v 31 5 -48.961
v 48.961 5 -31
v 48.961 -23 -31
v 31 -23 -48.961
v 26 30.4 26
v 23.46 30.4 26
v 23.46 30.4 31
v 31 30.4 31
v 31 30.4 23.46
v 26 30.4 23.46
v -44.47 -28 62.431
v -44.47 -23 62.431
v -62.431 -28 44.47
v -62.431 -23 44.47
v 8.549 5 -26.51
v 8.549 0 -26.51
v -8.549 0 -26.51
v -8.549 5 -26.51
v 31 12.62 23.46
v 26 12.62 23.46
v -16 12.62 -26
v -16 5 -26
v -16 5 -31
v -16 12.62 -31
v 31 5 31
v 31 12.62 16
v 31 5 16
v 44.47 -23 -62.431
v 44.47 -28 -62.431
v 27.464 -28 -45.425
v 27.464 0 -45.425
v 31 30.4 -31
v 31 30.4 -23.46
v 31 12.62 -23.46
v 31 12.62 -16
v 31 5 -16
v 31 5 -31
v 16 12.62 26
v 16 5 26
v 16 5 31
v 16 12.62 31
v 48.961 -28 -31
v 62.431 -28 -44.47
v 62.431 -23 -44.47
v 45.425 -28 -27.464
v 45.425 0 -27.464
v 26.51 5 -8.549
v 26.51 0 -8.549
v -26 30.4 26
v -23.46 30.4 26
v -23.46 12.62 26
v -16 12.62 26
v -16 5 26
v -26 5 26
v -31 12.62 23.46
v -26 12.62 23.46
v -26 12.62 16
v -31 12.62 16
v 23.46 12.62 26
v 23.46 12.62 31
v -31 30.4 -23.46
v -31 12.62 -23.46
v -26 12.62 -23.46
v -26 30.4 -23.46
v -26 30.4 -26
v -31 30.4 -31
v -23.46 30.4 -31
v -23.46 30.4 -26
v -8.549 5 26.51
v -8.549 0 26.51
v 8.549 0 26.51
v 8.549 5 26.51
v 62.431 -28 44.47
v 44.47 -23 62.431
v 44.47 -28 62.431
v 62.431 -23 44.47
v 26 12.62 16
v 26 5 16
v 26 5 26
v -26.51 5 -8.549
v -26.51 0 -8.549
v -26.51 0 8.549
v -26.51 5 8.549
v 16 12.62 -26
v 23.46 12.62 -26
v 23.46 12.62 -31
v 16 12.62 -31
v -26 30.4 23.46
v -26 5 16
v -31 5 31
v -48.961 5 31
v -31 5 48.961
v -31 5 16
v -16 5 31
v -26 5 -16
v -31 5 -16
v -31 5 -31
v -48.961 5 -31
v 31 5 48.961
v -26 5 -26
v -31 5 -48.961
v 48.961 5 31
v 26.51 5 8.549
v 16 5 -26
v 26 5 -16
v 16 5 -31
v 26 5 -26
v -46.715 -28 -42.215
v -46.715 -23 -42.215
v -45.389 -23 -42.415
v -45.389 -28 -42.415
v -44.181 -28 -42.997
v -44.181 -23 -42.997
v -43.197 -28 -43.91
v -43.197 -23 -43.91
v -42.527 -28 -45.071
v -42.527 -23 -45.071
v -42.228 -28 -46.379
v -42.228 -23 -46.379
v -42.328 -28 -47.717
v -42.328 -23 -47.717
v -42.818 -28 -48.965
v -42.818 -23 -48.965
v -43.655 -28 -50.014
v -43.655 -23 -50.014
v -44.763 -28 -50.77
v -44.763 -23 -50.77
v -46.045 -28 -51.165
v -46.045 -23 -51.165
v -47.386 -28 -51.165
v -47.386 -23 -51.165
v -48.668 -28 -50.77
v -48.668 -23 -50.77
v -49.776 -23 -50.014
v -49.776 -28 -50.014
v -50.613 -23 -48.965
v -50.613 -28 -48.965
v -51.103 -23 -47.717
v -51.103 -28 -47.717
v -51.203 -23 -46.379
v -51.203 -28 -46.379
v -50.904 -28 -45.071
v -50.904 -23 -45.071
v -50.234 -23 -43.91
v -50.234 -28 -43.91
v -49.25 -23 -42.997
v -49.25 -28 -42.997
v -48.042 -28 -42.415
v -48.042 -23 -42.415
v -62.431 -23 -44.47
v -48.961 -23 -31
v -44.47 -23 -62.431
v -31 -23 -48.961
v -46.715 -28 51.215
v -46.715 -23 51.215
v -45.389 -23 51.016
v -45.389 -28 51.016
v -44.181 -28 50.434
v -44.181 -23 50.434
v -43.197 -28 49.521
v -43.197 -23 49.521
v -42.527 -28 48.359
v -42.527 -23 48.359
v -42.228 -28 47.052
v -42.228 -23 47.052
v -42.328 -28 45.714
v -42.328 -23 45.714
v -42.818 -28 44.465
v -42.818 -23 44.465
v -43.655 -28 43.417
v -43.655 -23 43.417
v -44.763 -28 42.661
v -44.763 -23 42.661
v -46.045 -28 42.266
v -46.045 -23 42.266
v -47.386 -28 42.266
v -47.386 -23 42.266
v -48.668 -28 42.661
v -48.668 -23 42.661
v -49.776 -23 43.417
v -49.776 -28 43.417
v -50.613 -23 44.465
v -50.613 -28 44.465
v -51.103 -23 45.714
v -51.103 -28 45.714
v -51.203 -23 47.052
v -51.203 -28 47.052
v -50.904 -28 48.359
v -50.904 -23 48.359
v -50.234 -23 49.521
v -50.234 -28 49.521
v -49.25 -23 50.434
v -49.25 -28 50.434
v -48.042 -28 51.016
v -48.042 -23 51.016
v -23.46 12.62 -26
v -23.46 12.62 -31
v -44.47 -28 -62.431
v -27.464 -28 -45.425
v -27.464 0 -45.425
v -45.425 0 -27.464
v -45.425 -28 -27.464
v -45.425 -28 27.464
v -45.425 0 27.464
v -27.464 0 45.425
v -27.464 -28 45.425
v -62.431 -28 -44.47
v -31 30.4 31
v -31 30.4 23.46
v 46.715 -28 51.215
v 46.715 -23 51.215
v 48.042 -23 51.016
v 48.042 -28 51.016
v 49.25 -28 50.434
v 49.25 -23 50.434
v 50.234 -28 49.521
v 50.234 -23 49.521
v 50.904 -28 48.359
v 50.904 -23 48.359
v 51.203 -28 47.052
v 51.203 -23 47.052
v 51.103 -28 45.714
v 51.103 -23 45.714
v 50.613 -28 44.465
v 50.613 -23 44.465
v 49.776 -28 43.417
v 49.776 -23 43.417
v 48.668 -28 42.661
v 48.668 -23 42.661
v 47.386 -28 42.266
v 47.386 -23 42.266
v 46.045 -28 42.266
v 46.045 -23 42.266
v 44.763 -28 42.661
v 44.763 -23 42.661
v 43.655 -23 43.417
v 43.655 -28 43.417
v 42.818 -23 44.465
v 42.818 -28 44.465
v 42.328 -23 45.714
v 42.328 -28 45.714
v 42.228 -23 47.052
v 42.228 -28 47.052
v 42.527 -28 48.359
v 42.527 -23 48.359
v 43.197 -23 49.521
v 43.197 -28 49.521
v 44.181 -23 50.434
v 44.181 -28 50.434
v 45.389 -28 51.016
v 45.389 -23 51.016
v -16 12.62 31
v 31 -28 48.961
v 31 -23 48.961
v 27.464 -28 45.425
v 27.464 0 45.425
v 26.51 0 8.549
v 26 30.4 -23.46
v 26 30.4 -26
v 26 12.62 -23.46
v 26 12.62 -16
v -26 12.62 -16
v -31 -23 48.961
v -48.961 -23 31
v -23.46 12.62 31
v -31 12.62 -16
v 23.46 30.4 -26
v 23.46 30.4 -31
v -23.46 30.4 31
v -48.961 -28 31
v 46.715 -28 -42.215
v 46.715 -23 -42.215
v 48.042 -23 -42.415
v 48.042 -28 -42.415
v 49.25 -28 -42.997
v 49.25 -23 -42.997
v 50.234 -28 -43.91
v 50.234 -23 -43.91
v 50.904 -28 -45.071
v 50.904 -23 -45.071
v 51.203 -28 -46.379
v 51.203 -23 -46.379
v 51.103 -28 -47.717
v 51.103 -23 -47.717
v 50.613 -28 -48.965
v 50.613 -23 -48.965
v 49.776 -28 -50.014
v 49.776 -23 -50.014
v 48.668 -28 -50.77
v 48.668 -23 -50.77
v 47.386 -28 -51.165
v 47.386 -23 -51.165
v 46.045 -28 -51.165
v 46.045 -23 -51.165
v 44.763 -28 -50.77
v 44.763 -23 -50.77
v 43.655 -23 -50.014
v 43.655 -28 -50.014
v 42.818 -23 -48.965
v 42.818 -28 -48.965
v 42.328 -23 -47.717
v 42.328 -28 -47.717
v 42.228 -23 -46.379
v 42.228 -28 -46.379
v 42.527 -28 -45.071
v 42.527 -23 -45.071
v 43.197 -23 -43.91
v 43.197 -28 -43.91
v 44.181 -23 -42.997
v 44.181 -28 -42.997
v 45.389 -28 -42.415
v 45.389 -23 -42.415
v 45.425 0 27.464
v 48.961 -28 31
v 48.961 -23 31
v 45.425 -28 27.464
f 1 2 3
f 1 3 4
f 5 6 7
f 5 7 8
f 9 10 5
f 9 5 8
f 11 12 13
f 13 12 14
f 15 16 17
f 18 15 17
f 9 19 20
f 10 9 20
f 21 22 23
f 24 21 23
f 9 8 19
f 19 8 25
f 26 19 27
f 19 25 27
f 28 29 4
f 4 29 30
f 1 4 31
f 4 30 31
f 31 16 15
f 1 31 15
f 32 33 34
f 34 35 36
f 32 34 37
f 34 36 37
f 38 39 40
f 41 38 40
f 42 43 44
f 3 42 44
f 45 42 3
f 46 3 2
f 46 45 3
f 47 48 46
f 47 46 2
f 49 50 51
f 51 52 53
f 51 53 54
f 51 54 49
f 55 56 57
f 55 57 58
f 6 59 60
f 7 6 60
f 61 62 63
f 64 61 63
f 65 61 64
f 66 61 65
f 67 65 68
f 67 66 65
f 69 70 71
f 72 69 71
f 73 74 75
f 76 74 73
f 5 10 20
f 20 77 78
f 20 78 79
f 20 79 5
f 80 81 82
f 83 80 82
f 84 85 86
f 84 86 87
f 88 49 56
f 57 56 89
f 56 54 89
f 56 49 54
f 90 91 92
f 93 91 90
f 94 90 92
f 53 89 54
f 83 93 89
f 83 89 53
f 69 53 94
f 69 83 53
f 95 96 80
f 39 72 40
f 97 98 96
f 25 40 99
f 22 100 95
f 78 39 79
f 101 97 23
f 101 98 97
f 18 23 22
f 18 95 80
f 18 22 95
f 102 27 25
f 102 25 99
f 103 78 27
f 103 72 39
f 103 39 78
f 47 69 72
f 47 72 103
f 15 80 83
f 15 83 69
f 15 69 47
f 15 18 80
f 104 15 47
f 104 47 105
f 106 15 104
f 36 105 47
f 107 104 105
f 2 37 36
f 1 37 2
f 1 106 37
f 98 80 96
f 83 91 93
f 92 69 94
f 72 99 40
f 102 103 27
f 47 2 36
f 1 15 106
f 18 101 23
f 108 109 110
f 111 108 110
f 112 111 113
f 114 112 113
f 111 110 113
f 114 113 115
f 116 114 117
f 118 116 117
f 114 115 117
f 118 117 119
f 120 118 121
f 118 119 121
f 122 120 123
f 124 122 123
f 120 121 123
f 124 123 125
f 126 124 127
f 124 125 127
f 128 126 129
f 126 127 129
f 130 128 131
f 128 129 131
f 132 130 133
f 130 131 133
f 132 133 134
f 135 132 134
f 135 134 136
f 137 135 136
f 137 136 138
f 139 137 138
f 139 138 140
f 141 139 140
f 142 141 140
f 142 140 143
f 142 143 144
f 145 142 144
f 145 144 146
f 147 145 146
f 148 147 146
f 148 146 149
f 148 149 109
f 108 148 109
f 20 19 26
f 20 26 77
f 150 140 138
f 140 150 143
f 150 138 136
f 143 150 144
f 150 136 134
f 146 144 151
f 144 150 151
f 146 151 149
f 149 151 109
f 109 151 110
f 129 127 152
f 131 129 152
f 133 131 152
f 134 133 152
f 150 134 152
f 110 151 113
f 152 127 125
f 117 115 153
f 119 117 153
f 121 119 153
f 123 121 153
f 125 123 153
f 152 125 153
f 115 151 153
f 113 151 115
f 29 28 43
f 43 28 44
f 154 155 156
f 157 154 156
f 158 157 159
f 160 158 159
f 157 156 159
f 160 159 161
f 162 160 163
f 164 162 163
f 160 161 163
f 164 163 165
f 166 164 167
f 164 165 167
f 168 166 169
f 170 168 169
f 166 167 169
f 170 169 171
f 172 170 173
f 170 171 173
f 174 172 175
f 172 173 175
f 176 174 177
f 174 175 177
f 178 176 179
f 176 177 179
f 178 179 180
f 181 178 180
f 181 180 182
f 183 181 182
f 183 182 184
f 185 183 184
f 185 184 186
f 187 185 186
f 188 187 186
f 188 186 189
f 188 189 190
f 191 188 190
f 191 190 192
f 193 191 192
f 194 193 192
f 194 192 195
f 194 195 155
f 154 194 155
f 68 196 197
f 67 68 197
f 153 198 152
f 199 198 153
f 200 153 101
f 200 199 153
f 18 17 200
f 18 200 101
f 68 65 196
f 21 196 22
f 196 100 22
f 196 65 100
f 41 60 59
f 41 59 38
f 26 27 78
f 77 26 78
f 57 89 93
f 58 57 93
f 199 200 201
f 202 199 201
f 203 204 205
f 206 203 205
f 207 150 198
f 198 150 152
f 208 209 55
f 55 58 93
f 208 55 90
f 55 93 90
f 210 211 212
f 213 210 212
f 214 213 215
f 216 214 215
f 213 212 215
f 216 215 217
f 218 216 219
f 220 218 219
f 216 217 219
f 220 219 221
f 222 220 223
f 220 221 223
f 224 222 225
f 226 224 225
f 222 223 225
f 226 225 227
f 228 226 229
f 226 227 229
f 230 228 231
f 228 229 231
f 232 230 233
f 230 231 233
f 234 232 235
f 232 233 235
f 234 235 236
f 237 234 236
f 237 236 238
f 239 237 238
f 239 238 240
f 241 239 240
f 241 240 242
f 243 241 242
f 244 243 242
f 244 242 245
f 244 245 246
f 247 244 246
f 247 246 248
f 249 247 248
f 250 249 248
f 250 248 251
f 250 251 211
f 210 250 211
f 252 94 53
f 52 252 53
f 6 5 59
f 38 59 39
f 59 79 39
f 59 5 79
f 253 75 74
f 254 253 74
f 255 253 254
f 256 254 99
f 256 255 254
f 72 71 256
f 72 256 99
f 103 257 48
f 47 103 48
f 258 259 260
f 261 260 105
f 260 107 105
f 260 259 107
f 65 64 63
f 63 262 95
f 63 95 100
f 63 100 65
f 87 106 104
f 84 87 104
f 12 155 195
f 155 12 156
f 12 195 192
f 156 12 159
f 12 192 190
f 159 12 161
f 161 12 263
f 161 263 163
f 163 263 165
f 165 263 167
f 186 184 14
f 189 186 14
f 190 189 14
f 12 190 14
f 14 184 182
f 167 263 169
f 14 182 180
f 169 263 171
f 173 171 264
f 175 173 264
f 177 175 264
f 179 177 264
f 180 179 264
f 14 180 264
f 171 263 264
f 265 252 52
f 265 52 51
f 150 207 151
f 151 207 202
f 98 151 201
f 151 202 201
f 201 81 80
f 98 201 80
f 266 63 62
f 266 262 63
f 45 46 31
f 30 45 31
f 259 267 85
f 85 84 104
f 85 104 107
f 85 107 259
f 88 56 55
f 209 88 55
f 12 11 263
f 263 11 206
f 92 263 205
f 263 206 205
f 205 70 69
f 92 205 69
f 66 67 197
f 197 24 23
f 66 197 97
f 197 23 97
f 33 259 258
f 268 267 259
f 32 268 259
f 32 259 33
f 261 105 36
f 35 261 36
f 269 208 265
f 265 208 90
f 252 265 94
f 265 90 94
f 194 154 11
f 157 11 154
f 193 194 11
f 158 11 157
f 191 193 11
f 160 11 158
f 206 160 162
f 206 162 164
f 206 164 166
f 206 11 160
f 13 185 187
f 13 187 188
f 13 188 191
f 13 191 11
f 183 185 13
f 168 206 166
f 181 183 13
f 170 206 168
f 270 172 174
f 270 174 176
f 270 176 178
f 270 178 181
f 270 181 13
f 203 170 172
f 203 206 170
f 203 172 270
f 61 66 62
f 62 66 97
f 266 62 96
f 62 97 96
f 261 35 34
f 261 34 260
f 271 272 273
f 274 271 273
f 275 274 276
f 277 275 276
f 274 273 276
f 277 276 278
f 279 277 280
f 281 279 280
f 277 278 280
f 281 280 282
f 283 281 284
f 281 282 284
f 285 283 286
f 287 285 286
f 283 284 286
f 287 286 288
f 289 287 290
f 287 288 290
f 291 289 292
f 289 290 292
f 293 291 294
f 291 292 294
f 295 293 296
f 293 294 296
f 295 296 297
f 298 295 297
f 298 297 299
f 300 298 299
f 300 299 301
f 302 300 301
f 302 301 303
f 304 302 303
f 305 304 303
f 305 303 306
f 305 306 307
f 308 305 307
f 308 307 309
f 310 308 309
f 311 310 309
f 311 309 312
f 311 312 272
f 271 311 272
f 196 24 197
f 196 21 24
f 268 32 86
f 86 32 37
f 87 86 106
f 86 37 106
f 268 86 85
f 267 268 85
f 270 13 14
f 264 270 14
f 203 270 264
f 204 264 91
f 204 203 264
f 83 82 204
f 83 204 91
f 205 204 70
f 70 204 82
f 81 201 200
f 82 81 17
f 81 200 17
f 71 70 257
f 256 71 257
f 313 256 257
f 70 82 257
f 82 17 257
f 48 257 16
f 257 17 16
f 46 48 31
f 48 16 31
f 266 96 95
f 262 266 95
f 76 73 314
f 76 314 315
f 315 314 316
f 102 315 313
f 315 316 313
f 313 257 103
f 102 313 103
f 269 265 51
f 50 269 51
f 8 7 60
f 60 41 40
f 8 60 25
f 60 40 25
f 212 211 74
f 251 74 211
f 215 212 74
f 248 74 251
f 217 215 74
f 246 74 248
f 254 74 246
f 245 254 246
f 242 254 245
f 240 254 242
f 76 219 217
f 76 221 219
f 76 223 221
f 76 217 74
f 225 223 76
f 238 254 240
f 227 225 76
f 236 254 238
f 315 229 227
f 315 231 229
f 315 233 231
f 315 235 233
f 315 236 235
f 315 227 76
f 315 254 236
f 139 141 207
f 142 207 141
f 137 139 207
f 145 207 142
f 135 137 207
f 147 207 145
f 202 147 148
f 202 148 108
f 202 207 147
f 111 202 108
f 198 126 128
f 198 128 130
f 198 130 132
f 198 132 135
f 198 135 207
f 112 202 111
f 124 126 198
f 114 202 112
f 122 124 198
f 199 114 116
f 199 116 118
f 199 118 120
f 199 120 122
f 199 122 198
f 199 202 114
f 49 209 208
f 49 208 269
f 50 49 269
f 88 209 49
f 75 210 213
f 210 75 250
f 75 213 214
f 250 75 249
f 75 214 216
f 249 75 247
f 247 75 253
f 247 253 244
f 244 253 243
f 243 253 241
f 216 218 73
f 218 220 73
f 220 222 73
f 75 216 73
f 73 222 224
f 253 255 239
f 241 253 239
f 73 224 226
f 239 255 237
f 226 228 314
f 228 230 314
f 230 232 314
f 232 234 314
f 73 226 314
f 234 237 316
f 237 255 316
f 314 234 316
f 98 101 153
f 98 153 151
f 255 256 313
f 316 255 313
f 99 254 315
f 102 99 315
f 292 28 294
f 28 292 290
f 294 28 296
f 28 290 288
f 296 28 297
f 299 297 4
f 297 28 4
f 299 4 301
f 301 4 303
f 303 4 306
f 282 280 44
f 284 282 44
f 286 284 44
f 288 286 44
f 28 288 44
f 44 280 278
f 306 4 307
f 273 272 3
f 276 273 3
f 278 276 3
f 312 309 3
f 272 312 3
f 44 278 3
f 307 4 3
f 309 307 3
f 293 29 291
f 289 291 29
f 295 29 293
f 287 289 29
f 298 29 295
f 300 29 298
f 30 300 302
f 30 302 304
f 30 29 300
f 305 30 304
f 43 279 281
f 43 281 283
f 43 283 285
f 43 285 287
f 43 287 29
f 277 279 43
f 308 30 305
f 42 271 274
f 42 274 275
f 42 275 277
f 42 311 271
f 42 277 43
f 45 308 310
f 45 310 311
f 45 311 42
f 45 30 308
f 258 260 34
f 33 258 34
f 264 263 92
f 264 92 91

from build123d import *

# Parameters (mm, degrees)
BOSS_EXTRUDE1_DEPTH = 5
BOSS_EXTRUDE2_DEPTH = 7.62
BOSS_EXTRUDE3_DEPTH = 28
SKETCH5_W           = 25.4
SKETCH5_H           = 5
BOSS_EXTRUDE4_DEPTH = 19.05
SKETCH6_W           = 25.4
SKETCH6_H           = 5
BOSS_EXTRUDE5_DEPTH = 19.05
SKETCH7_W           = 25.4
SKETCH7_H           = 5
BOSS_EXTRUDE6_DEPTH = 19.05
SKETCH8_W           = 25.4
SKETCH8_H           = 5
BOSS_EXTRUDE7_DEPTH = 19.05
SKETCH9_R           = 4.5
CUT_EXTRUDE1_DEPTH  = 12.7
BOSS_EXTRUDE8_DEPTH = 25.4


with BuildPart() as part:
    # Sketch2 → Boss-Extrude1 (new body)
    with BuildSketch(Plane(origin=(0, 0, 0), x_dir=(1, 0, 0), z_dir=(0, 1, 0))):
        Polygon((-31, 48.960512242), (-48.960512242, 31), (-26.509871939, 8.549359697), (-26.509871939, -8.549359697), (-48.960512242, -31), (-31, -48.960512242), (-8.549359697, -26.509871939), (8.549359697, -26.509871939), (31, -48.960512242), (48.960512242, -31), (26.509871939, -8.549359697), (26.509871939, 8.549359697), (48.960512242, 31), (31, 48.960512242), (8.549359697, 26.509871939), (-8.549359697, 26.509871939), align=None)
    extrude(amount=BOSS_EXTRUDE1_DEPTH)

    # Sketch3 → Boss-Extrude2 (add)
    with BuildSketch(Plane(origin=(0, 5, 0), x_dir=(-1, 0, 0), z_dir=(0, 1, 0))):
        Polygon((31, 31), (16, 31), (16, 26), (26, 26), (26, 16), (31, 16), align=None)
        Polygon((31, -31), (31, -16), (26, -16), (26, -26), (16, -26), (16, -31), align=None)
        Polygon((-31, 31), (-31, 16), (-26, 16), (-26, 26), (-16, 26), (-16, 31), align=None)
        Polygon((-31, -31), (-16, -31), (-16, -26), (-26, -26), (-26, -16), (-31, -16), align=None)
    extrude(amount=BOSS_EXTRUDE2_DEPTH)

    # Sketch4 → Boss-Extrude3 (add)
    with BuildSketch(Plane(origin=(0, 0, 0), x_dir=(-1, 0, 0), z_dir=(0, -1, 0))):
        Polygon((31, -48.960512242), (48.960512242, -31), (45.424978336, -27.464466094), (27.464466094, -45.424978336), align=None)
        Polygon((48.960512242, 31), (31, 48.960512242), (27.464466094, 45.424978336), (45.424978336, 27.464466094), align=None)
        Polygon((-31, 48.960512242), (-48.960512242, 31), (-45.424978336, 27.464466094), (-27.464466094, 45.424978336), align=None)
        Polygon((-48.960512242, -31), (-31, -48.960512242), (-27.464466094, -45.424978336), (-45.424978336, -27.464466094), align=None)
    extrude(amount=BOSS_EXTRUDE3_DEPTH)

    # Sketch5 → Boss-Extrude4 (add)
    with BuildSketch(Plane(origin=(104.086919113, 0, 24.126406871), x_dir=(0.7071067811865459, 0, 0.7071067811865492), z_dir=(-0.7071067811865492, 0, 0.7071067811865459))):
        with Locations((-90.660512242, -25.5)):
            Rectangle(SKETCH5_W, SKETCH5_H)
    extrude(amount=-BOSS_EXTRUDE4_DEPTH)

    # Sketch6 → Boss-Extrude5 (add)
    with BuildSketch(Plane(origin=(32.44615075, 0, -112.406662992), x_dir=(0.7071067811865465, 0, -0.7071067811865487), z_dir=(0.7071067811865487, 0, 0.7071067811865465))):
        with Locations((-102.426406871, -25.5)):
            Rectangle(SKETCH6_W, SKETCH6_H)
    extrude(amount=-BOSS_EXTRUDE5_DEPTH)

    # Sketch7 → Boss-Extrude6 (add)
    with BuildSketch(Plane(origin=(-39.980256121, 0, 39.980256121), x_dir=(-0.7071067811865459, 0, -0.7071067811865492), z_dir=(0.7071067811865492, 0, -0.7071067811865459))):
        with Locations((0, -25.5)):
            Rectangle(SKETCH7_W, SKETCH7_H)
    extrude(amount=-BOSS_EXTRUDE6_DEPTH)

    # Sketch8 → Boss-Extrude7 (add)
    with BuildSketch(Plane(origin=(39.980256121, 0, 39.980256121), x_dir=(0.7071067811865459, 0, -0.7071067811865492), z_dir=(0.7071067811865492, 0, 0.7071067811865459))):
        with Locations((0, -25.5)):
            Rectangle(SKETCH8_W, SKETCH8_H)
    extrude(amount=BOSS_EXTRUDE7_DEPTH)

    # Sketch9 → Cut-Extrude1 (cut)
    with BuildSketch(Plane(origin=(0, -23, 0), x_dir=(1, 0, 0), z_dir=(0, 1, 0))):
        with Locations((46.715448212, -46.715448212)):
            Circle(SKETCH9_R)
        with Locations((46.715448212, 46.715448212)):
            Circle(SKETCH9_R)
        with Locations((-46.715448212, 46.715448212)):
            Circle(SKETCH9_R)
        with Locations((-46.715448212, -46.715448212)):
            Circle(SKETCH9_R)
    extrude(amount=-CUT_EXTRUDE1_DEPTH, mode=Mode.SUBTRACT)

    # Sketch10 → Boss-Extrude8 (add)
    with BuildSketch(Plane(origin=(0, 5, 0), x_dir=(1, 0, 0), z_dir=(0, 1, 0))):
        Polygon((31, -31), (31, -23.46), (26, -23.46), (26, -26), (23.46, -26), (23.46, -31), align=None)
        Polygon((23.46, 31), (23.46, 26), (26, 26), (26, 23.46), (31, 23.46), (31, 31), align=None)
        Polygon((-31, 31), (-31, 23.46), (-26, 23.46), (-26, 26), (-23.46, 26), (-23.46, 31), align=None)
        Polygon((-23.46, -31), (-23.46, -26), (-26, -26), (-26, -23.46), (-31, -23.46), (-31, -31), align=None)
    extrude(amount=BOSS_EXTRUDE8_DEPTH)


solid = part.part
